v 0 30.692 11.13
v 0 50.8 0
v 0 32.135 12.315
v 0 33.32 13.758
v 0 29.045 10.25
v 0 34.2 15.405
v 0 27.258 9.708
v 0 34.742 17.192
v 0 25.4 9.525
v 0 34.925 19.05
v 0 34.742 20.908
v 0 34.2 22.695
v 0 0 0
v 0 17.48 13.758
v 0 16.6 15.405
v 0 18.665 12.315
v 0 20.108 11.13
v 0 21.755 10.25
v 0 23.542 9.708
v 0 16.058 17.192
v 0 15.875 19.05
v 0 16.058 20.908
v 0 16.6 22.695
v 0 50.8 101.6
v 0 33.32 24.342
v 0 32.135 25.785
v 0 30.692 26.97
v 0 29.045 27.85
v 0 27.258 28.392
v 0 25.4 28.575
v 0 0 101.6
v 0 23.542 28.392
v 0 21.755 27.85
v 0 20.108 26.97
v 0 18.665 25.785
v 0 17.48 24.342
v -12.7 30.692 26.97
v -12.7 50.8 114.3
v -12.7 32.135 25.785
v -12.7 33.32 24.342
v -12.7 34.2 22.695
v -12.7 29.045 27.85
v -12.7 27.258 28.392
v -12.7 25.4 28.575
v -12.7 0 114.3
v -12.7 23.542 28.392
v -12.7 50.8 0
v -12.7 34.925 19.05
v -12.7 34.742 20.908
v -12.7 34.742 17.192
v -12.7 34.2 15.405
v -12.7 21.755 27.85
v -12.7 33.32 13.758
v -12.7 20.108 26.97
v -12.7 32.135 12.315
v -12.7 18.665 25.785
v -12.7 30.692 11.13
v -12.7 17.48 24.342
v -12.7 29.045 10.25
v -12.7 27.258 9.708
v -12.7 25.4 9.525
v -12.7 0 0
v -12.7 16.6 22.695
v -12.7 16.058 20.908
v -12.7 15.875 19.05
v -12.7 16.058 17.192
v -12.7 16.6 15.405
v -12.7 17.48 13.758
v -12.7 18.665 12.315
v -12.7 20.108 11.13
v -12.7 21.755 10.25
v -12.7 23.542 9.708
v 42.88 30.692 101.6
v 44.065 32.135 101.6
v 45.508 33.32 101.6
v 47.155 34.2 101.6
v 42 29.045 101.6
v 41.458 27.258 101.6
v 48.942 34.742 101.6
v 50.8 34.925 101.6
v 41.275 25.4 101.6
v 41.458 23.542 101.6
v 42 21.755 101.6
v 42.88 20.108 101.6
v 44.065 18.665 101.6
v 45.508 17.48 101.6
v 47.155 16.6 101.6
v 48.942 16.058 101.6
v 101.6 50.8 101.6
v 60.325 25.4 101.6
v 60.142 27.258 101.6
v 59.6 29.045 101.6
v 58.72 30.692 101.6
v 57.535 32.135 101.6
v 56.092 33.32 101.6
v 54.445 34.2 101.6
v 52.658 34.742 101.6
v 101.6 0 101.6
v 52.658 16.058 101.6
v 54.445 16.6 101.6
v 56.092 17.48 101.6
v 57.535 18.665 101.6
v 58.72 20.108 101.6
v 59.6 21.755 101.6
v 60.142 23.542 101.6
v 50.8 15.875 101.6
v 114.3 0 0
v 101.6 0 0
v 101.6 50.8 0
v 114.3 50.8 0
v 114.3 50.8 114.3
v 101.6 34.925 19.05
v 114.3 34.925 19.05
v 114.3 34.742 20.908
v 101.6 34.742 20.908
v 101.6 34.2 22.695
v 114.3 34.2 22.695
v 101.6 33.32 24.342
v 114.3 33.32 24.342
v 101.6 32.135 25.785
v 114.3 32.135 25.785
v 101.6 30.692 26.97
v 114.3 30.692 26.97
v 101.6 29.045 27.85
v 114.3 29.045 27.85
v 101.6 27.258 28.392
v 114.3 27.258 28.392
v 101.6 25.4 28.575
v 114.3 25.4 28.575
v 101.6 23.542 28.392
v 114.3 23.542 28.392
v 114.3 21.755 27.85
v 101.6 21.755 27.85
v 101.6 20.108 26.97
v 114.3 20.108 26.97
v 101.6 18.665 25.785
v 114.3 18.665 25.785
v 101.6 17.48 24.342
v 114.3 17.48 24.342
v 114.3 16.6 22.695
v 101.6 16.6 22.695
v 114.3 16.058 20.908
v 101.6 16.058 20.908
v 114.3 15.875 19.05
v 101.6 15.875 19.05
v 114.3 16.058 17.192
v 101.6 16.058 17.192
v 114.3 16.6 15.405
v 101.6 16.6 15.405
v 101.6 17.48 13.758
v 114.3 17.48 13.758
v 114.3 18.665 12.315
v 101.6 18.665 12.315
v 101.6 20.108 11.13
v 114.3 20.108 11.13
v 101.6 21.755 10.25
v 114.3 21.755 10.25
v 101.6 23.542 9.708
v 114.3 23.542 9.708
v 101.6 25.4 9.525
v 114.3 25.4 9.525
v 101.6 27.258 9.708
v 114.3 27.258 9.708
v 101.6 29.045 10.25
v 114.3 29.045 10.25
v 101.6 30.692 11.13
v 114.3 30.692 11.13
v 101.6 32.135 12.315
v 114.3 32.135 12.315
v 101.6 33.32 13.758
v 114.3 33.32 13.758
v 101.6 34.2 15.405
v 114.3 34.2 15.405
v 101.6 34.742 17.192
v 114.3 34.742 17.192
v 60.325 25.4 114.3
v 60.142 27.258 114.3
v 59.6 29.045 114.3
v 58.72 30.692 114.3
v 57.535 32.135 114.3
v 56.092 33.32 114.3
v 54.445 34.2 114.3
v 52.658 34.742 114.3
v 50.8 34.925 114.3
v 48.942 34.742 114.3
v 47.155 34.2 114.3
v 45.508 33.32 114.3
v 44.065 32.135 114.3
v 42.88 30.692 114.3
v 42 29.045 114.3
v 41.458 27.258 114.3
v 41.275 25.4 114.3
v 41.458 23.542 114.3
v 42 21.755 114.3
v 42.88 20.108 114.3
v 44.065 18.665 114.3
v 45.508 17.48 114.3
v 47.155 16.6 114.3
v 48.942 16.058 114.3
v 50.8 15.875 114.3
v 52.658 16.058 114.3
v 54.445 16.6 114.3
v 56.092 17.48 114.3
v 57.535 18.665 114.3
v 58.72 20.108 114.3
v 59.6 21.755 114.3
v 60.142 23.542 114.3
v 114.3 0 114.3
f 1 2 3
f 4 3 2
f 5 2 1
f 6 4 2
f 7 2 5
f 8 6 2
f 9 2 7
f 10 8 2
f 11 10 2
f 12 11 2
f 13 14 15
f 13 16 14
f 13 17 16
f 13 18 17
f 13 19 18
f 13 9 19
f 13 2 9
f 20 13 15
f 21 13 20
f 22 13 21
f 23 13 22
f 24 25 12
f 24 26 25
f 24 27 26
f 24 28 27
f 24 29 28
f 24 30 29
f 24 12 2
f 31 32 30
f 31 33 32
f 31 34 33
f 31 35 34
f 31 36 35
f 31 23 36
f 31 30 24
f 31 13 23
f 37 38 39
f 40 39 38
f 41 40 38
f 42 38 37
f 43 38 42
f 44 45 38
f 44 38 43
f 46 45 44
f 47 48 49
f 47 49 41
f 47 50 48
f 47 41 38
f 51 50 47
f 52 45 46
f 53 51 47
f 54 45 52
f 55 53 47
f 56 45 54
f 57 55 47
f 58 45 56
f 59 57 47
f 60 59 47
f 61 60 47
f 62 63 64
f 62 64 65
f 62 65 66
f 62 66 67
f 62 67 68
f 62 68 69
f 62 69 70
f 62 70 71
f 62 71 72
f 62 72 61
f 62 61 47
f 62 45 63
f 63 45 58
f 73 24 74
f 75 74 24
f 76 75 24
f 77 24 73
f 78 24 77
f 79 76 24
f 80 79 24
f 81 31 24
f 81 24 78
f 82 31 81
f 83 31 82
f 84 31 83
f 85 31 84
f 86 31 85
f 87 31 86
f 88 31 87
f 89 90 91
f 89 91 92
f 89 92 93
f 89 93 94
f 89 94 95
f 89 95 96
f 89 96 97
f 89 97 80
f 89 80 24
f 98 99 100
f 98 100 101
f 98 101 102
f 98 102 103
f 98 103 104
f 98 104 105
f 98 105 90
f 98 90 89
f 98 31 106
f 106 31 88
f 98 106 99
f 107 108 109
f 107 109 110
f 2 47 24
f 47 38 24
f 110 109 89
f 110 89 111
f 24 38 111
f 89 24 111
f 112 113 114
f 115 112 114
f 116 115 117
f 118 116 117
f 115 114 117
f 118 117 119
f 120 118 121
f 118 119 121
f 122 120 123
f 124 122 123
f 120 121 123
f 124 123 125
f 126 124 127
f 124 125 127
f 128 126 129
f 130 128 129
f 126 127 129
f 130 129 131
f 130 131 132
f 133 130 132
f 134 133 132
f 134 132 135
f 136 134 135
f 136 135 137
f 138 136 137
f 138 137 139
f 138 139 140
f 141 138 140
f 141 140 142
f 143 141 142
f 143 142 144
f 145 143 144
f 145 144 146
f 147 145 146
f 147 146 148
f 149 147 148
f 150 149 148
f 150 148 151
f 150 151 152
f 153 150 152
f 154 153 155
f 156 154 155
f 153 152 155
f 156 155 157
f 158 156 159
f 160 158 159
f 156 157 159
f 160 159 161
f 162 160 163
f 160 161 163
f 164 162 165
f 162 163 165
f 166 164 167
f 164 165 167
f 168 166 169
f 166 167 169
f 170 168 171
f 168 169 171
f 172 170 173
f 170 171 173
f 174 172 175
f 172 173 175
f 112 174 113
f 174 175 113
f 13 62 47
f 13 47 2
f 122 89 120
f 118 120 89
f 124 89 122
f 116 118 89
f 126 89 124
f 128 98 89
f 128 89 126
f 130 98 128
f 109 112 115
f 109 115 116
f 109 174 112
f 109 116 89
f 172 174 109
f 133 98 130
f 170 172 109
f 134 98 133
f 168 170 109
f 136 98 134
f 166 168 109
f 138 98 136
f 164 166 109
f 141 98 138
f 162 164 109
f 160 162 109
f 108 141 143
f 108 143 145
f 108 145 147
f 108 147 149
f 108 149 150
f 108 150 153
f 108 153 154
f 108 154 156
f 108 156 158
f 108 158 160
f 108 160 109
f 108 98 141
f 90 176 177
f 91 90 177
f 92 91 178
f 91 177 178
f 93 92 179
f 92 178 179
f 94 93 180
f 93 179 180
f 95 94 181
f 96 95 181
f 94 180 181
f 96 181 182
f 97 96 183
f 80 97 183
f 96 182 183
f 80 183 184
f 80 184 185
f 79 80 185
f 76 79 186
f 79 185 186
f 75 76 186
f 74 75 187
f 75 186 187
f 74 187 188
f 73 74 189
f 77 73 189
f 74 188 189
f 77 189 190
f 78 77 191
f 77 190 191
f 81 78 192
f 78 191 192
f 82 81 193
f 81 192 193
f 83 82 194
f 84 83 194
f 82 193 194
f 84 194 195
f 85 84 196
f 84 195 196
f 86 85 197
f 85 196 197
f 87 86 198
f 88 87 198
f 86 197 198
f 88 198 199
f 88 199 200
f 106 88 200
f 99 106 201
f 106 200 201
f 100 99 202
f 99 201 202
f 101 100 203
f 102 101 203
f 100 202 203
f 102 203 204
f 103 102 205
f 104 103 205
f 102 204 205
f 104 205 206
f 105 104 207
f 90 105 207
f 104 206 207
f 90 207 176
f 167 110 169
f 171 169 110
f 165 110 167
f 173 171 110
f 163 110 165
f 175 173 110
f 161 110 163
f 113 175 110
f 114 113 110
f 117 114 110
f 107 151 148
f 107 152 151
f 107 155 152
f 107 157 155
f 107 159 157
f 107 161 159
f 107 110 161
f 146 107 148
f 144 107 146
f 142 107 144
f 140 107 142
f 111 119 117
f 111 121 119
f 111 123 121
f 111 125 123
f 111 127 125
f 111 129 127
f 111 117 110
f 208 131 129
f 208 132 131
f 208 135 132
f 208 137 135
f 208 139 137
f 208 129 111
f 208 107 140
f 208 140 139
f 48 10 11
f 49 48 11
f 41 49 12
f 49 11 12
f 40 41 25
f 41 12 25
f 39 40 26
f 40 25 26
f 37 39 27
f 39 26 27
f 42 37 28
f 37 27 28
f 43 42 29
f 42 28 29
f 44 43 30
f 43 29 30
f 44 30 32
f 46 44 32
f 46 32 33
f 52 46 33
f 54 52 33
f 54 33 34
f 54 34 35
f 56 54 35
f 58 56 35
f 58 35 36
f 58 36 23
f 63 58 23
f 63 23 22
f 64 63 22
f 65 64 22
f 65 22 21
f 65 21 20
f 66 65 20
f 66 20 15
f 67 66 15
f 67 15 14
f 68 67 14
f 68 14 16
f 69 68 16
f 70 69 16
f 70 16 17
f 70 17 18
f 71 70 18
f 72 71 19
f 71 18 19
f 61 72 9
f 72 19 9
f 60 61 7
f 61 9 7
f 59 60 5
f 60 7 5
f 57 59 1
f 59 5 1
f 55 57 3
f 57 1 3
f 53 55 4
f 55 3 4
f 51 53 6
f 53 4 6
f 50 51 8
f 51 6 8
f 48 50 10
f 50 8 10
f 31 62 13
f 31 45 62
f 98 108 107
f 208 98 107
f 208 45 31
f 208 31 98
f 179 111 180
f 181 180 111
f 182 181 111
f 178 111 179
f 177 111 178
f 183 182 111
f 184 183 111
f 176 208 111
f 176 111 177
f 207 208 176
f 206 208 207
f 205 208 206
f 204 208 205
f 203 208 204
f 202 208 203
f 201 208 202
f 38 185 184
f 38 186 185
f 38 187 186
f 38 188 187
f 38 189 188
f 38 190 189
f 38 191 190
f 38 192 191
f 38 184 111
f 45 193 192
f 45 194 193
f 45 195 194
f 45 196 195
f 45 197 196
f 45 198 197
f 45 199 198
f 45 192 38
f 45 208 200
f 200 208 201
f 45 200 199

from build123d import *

# Parameters (mm, degrees)
F1_DEPTH = 50.8
F2_R     = 9.525
F3_DEPTH = 127
F4_R     = 9.525
F5_DEPTH = 12.7


with BuildPart() as f1:
    # F0 (on Front) → F1 (new body)
    with BuildSketch(Plane.XZ):
        Polygon((-12.7, 0), (0, 0), (0, 101.6), (101.6, 101.6), (101.6, 0), (114.3, 0), (114.3, 114.3), (-12.7, 114.3), align=None)
    extrude(amount=-F1_DEPTH)

    # F2 (on face) → F3 (cut)
    with BuildSketch(Plane.YZ.offset(114.3)):
        with Locations((25.4, 19.05)):
            Circle(F2_R)
    extrude(amount=-F3_DEPTH, mode=Mode.SUBTRACT)

    # F4 (on face) → F5 (cut, through all)
    with BuildSketch(Plane.XY.offset(114.3)):
        with Locations((50.8, 25.4)):
            Circle(F4_R)
    extrude(amount=-F5_DEPTH, mode=Mode.SUBTRACT)


solid = f1.part
